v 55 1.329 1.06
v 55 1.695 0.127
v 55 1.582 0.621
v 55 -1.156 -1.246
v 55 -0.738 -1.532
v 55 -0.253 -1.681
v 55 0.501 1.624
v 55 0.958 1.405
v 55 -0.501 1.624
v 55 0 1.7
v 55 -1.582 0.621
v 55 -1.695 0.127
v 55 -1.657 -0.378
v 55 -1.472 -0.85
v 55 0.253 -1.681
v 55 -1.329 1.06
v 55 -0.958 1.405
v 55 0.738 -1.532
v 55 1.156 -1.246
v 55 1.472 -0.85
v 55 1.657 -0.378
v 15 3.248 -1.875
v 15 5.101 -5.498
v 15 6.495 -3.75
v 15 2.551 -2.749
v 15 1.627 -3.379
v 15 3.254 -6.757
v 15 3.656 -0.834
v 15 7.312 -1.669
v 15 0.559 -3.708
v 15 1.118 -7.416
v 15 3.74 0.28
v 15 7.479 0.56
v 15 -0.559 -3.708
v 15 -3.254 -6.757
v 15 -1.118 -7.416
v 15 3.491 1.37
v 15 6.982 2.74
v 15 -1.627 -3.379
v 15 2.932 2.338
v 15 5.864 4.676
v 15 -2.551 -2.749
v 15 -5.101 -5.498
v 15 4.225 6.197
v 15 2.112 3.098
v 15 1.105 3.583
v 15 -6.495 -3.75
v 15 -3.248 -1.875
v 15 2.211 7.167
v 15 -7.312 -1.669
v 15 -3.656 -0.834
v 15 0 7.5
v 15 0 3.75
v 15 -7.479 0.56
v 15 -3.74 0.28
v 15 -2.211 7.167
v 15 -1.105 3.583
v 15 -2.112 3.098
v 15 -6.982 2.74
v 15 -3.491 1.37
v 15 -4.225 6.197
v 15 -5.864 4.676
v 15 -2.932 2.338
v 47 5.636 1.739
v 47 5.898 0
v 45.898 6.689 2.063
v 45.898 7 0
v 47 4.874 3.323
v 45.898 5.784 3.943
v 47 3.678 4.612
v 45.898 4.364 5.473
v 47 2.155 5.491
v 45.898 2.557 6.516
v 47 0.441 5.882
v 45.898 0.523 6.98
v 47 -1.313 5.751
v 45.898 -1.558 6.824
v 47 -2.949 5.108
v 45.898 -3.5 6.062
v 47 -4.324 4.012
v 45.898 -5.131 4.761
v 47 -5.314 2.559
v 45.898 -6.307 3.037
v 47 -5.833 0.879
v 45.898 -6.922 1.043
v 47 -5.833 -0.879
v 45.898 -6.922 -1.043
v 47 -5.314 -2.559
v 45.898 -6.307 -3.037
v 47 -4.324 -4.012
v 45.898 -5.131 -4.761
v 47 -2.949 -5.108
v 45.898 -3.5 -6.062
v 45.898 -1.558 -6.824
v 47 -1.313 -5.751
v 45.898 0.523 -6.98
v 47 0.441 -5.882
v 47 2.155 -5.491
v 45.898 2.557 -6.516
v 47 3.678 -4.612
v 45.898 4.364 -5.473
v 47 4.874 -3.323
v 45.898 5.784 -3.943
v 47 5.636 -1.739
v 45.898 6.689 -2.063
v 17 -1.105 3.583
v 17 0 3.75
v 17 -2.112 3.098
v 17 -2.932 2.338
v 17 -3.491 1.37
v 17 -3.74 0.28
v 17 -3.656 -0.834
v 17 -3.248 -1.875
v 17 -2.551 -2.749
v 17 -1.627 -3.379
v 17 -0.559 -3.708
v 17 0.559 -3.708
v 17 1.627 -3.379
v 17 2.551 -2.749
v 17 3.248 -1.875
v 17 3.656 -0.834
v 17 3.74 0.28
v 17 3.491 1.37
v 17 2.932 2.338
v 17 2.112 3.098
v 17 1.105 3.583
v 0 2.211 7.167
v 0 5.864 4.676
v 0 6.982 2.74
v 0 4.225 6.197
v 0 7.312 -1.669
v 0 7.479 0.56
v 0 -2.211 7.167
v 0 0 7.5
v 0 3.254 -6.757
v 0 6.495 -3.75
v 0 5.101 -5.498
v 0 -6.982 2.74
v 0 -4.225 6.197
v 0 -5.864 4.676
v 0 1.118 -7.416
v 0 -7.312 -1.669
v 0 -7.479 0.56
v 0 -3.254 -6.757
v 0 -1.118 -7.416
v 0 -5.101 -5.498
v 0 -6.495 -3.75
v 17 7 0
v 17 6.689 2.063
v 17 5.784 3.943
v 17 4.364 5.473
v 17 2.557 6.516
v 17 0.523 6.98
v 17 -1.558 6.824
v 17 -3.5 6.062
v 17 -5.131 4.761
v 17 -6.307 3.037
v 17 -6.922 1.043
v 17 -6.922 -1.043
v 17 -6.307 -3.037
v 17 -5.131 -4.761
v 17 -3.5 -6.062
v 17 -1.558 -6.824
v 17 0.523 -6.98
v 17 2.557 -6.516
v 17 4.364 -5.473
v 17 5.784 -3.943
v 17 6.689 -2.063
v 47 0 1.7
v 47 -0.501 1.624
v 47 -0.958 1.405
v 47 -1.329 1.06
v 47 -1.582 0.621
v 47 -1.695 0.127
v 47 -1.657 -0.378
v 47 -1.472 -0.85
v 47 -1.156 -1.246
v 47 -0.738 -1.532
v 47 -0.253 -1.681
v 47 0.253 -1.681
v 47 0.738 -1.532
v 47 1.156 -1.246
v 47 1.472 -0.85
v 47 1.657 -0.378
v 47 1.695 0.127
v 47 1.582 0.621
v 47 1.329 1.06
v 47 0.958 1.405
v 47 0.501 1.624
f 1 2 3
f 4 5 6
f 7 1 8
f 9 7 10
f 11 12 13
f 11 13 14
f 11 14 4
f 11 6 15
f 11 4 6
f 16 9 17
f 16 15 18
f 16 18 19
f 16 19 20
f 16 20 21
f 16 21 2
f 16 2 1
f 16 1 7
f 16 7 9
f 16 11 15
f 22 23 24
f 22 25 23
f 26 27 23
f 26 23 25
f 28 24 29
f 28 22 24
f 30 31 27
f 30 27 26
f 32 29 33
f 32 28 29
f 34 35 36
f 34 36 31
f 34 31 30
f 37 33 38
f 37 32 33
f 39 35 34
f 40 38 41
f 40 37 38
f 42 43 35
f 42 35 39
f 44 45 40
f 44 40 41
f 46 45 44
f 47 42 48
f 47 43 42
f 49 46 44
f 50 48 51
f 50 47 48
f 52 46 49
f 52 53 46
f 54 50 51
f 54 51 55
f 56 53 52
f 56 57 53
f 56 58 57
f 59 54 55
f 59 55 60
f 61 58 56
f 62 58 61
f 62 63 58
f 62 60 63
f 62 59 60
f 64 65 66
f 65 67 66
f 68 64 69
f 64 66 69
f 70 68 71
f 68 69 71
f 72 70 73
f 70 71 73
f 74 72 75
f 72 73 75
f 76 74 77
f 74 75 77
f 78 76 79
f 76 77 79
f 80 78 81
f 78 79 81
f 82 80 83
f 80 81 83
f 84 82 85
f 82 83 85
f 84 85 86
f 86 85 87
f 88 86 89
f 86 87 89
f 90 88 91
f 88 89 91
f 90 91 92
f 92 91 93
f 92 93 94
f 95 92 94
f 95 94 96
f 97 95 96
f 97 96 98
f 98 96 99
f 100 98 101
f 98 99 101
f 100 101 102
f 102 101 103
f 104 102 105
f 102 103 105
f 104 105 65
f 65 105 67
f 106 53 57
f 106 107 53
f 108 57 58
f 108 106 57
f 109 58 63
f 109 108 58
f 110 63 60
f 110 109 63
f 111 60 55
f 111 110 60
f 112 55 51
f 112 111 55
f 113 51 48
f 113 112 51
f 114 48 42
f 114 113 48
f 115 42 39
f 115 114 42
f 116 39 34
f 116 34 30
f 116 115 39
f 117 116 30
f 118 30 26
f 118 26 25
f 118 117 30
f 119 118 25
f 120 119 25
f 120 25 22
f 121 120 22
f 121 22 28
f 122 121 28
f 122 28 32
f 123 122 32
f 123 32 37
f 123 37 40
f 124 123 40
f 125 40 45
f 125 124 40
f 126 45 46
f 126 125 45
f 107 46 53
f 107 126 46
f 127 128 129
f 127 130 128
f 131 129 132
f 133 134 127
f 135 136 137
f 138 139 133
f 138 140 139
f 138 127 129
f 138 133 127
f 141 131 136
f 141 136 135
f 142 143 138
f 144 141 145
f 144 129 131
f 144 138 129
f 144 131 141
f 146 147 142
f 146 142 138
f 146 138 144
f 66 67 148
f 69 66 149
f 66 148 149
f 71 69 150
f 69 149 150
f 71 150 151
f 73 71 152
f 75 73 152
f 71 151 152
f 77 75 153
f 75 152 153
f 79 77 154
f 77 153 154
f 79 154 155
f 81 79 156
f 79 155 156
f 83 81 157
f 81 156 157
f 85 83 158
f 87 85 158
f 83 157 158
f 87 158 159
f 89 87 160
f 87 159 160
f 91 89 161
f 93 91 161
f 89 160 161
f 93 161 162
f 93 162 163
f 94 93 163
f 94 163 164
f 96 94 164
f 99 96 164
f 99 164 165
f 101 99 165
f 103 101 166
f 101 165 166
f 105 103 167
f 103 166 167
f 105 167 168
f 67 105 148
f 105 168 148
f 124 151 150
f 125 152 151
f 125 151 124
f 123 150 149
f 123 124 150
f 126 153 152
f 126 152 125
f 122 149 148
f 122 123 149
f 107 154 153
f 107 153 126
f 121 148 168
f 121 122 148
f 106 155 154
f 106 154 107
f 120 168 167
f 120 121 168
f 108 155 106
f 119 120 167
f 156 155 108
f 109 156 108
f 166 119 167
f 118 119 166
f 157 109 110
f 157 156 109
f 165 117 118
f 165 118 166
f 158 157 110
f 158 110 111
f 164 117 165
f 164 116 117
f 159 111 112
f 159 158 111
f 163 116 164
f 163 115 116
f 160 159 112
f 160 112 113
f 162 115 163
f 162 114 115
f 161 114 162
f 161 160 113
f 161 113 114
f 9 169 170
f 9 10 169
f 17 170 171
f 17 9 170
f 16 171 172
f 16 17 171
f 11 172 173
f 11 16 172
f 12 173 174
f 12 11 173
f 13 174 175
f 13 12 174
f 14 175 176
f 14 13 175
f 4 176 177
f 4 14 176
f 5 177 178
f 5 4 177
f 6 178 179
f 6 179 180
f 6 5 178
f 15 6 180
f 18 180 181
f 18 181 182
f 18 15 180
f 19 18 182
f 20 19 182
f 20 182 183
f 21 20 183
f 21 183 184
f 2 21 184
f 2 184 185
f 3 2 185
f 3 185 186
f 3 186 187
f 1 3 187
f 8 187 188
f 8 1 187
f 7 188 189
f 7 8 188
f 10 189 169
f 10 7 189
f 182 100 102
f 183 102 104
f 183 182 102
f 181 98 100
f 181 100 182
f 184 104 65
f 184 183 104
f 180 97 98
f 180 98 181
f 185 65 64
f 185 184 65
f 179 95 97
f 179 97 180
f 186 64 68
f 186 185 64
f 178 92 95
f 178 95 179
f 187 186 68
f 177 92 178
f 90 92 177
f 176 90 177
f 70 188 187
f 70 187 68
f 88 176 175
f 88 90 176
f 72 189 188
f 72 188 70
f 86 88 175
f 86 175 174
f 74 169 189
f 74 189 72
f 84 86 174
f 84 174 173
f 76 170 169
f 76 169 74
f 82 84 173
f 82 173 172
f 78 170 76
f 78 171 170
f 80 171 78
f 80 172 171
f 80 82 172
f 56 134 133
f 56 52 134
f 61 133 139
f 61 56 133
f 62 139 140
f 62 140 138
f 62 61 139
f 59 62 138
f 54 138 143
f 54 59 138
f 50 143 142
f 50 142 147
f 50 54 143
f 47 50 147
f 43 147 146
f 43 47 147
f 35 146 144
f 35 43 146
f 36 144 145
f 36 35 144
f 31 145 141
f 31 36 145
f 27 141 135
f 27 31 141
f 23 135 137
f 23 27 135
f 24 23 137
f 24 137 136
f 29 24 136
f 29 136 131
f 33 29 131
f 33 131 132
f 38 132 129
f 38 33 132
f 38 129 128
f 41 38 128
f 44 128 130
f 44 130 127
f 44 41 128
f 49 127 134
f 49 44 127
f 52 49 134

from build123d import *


# Read off the part's stored shape, not the designer's step: M14x2.0 Machine Threads Stud1
with BuildPart() as part:
    # Sketch1 → Revolve1 (revolve)
    with BuildSketch(Plane.XY, mode=Mode.PRIVATE) as revolve1_sk:
        Polygon((0, 0), (0, 7.5), (15, 7.5), (15, 3.75), (17, 3.75), (17, 7.5), (47, 7.5), (47, 1.7), (55, 1.7), (55, 0), align=None)
    revolve(revolve1_sk.sketch.rotate(Axis((-20.400760227, 0, 0), (1, 0, 0)), 90), axis=Axis((-20.400760227, 0, 0), (1, 0, 0)))

    # M14x2.0 Machine Threads Stud1 outline → M14x2.0 Machine Threads Stud1 (revolve, cut)
    with BuildSketch(Plane.YX):
        Polygon((7.5, 47), (5.8985, 47), (7, 45.8985), (7, 17), (7.5, 17), align=None)
    revolve(axis=Axis((0, 0, 0), (1, 0, 0)), mode=Mode.SUBTRACT)


solid = part.part
